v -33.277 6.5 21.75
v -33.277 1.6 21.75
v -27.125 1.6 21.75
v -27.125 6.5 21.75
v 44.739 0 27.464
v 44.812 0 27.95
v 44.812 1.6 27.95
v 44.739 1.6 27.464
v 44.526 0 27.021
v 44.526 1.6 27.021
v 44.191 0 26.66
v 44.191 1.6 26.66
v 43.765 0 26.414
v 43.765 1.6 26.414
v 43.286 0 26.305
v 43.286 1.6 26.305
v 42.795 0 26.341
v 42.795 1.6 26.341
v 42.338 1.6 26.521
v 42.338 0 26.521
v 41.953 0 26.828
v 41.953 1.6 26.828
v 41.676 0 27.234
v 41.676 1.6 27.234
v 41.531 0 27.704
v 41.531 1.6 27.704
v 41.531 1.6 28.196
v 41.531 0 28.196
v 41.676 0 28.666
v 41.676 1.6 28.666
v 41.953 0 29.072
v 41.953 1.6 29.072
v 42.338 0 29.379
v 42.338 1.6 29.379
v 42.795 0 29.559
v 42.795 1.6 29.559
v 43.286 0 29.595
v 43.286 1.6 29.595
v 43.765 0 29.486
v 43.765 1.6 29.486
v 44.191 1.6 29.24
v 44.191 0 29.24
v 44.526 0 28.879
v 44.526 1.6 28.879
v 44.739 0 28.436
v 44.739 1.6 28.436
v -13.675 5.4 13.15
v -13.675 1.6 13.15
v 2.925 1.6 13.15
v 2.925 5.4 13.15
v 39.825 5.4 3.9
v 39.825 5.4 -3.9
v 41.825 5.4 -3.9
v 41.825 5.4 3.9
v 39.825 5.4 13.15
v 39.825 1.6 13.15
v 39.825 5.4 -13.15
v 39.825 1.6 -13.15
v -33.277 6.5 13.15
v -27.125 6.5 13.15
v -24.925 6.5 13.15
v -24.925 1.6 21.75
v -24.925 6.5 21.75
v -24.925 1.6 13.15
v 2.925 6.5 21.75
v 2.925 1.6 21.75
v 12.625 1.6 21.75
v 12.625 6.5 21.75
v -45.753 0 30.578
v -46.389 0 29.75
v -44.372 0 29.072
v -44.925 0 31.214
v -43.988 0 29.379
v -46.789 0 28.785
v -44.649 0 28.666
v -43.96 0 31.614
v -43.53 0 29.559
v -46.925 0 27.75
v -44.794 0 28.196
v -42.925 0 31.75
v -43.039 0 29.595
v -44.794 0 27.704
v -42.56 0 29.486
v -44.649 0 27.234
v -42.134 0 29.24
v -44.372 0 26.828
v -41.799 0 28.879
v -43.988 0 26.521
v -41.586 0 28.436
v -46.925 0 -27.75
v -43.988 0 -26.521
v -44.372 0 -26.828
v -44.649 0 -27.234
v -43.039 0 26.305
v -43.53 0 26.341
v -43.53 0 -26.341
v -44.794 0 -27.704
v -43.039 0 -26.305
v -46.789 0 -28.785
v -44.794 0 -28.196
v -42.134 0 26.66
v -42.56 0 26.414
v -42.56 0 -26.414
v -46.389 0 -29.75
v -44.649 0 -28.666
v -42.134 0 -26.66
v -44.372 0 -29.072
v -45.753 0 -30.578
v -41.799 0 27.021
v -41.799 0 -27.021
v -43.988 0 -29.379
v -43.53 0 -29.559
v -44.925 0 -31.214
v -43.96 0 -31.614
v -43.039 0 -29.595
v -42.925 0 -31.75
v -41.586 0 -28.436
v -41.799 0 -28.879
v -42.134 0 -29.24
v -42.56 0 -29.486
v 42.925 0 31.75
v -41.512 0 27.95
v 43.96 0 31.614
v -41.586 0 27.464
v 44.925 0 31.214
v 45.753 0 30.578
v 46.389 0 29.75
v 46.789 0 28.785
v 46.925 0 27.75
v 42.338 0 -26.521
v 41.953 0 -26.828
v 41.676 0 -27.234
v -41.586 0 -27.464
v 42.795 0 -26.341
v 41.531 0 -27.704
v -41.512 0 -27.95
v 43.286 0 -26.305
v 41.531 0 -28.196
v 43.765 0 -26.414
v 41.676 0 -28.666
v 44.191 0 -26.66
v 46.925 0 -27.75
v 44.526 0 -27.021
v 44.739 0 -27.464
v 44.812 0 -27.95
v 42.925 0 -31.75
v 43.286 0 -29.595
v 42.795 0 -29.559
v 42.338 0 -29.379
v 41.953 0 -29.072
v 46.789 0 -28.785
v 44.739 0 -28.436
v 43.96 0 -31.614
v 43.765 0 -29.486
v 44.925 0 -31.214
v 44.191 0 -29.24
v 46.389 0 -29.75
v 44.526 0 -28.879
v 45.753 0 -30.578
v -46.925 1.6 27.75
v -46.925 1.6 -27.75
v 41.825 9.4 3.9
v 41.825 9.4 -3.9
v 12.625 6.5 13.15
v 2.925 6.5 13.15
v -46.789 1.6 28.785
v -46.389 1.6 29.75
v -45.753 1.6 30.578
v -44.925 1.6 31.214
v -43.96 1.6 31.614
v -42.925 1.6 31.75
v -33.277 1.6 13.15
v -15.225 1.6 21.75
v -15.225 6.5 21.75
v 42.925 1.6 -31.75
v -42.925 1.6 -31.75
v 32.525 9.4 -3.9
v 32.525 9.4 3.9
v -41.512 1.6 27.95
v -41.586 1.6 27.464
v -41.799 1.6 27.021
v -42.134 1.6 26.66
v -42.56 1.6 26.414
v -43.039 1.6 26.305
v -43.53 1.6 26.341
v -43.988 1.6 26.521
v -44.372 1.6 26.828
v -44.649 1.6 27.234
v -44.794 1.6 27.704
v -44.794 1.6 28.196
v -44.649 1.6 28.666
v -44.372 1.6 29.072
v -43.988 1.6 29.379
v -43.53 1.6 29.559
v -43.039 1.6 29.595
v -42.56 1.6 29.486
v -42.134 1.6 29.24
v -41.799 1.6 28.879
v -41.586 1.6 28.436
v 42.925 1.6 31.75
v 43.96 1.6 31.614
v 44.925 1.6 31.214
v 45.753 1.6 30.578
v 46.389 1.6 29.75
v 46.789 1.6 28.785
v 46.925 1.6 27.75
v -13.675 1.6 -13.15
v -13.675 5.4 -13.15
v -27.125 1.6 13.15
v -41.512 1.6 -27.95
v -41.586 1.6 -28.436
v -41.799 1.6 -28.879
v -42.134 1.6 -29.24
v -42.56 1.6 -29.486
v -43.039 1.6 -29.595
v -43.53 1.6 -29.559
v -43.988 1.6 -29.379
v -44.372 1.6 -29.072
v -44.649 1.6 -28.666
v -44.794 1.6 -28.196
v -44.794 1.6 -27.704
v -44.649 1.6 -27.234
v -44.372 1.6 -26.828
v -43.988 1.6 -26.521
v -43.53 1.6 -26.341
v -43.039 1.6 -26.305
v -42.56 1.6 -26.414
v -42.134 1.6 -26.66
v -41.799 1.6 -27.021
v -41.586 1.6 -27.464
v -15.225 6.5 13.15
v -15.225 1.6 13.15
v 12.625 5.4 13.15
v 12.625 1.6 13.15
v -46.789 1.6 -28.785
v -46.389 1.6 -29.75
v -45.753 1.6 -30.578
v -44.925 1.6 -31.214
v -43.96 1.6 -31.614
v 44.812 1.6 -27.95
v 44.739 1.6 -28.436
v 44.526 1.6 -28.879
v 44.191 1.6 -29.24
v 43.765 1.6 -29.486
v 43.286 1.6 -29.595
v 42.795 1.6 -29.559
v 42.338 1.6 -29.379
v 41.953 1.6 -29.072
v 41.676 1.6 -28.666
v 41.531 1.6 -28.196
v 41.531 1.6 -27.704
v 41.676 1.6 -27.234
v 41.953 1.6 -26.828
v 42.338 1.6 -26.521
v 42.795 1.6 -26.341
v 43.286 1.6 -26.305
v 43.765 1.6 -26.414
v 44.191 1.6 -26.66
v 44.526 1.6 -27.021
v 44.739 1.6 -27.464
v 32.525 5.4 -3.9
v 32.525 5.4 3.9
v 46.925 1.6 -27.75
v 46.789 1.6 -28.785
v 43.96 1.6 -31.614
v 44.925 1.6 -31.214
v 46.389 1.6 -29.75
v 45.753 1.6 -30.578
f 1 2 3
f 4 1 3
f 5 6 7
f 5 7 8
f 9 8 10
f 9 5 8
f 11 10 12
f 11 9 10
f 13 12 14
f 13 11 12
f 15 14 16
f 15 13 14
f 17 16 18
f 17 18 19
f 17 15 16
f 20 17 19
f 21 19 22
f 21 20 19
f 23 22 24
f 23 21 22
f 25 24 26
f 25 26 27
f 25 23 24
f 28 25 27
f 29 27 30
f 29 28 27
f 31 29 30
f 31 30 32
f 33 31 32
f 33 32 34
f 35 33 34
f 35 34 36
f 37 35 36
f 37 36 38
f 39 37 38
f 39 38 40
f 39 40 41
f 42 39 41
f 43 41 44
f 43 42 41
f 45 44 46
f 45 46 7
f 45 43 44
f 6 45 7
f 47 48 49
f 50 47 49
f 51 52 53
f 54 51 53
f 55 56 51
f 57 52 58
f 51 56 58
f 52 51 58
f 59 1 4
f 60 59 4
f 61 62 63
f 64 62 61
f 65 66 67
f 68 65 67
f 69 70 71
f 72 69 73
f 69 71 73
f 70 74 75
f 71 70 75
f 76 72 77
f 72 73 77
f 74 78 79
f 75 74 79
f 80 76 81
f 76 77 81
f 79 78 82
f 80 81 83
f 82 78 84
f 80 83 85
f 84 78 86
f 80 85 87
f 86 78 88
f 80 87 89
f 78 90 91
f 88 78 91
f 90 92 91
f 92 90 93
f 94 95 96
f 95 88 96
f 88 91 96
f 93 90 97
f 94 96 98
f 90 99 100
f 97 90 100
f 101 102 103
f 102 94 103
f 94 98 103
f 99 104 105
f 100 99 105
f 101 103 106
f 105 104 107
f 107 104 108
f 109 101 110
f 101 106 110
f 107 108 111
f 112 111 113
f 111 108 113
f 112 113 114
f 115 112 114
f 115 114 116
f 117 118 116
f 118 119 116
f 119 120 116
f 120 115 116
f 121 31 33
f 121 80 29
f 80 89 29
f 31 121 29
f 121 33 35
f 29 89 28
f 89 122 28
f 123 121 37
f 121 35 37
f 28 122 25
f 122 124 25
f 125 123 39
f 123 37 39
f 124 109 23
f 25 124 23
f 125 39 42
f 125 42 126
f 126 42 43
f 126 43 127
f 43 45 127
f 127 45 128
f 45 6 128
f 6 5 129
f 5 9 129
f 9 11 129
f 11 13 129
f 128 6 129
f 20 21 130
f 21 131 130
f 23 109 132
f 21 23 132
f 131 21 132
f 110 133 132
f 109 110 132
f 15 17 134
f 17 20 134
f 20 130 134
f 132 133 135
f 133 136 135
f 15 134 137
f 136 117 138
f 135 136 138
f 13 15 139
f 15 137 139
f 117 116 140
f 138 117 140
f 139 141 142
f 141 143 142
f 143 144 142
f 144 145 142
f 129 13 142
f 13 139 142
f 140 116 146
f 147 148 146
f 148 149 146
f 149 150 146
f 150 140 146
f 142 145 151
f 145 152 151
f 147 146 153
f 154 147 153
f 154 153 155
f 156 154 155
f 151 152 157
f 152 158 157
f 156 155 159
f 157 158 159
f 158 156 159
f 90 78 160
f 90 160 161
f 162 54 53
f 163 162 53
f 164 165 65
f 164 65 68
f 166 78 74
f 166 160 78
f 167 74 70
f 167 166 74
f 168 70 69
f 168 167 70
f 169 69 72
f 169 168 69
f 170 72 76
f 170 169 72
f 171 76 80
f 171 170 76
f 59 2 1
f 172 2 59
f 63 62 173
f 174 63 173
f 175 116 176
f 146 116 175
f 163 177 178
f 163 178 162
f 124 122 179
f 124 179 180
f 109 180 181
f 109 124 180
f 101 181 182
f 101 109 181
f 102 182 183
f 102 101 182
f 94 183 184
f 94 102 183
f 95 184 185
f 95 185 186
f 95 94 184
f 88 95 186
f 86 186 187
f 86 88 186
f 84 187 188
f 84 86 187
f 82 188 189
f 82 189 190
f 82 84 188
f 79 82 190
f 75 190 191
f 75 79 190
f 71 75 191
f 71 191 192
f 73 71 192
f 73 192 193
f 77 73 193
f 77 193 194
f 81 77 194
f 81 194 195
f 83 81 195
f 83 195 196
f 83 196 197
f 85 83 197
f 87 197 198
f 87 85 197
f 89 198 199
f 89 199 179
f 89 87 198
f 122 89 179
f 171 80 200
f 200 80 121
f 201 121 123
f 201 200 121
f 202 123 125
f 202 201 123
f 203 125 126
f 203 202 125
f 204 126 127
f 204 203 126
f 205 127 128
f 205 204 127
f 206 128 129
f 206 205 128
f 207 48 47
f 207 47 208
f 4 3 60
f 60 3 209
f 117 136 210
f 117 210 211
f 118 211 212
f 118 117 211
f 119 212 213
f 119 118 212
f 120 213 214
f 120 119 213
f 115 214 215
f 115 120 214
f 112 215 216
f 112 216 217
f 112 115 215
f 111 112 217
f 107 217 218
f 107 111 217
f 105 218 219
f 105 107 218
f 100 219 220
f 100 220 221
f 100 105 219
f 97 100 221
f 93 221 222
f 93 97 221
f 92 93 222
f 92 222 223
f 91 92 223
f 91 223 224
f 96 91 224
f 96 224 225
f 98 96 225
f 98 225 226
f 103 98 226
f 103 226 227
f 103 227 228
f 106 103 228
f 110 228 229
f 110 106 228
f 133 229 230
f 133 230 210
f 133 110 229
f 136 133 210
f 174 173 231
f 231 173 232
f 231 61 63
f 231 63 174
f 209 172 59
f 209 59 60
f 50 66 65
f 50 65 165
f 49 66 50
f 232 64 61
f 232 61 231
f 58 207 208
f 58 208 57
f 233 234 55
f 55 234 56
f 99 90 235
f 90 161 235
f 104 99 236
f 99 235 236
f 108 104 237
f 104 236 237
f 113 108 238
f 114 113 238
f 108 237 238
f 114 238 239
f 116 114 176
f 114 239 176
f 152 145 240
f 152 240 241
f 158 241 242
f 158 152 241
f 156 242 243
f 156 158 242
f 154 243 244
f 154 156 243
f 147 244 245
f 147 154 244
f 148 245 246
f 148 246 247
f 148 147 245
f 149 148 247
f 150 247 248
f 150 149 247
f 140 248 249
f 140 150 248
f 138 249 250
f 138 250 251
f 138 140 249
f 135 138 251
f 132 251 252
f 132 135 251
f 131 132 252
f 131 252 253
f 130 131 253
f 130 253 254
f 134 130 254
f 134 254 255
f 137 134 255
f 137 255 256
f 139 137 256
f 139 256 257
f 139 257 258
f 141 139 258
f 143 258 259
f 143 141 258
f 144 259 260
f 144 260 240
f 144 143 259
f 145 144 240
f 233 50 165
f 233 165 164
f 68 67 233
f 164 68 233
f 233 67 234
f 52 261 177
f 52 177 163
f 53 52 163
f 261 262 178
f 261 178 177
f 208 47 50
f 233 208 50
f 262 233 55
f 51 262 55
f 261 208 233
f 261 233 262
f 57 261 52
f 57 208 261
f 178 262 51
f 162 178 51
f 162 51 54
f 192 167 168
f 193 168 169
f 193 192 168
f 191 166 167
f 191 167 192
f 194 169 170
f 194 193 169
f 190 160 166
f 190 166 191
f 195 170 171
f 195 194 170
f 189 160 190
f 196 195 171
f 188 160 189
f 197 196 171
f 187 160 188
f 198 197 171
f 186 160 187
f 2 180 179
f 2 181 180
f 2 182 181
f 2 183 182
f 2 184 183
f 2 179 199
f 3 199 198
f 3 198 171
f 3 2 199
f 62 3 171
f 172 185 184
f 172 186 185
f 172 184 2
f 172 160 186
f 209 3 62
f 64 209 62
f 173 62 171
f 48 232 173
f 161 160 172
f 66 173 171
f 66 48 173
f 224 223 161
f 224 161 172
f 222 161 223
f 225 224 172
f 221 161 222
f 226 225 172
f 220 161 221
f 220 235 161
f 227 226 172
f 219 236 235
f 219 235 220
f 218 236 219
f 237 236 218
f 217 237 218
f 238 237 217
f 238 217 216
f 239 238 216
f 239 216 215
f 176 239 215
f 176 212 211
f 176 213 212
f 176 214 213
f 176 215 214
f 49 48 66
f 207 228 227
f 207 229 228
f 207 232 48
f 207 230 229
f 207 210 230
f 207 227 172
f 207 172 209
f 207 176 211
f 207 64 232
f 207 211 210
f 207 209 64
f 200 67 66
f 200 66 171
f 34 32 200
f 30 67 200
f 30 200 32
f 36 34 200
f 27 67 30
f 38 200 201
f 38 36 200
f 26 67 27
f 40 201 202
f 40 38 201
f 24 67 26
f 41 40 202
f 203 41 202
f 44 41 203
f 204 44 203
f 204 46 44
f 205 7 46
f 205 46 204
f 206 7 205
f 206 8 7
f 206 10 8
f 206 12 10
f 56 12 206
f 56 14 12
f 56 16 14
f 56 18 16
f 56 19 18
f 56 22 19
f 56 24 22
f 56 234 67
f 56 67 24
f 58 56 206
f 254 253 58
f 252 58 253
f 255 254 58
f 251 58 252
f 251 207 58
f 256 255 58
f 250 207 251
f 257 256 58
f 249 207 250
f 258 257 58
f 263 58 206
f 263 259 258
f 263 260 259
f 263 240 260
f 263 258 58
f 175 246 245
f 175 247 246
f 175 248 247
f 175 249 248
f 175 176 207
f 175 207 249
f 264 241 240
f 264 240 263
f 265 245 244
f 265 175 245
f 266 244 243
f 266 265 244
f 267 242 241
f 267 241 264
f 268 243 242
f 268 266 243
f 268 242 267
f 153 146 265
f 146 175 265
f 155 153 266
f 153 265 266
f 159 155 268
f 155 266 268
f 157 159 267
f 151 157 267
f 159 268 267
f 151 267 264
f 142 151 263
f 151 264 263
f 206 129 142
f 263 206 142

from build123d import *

# Parameters (mm, degrees)
SKETCH1_W           = 93.85
SKETCH1_H           = 63.5
SKETCH1_R           = 1.65
BOSS_EXTRUDE1_DEPTH = 1.6
FILLET1_R           = 4
SKETCH2_W           = 53.5
SKETCH2_H           = 26.3
BOSS_EXTRUDE2_DEPTH = 3.8
SKETCH3_W           = 9.3
SKETCH3_H           = 7.8
BOSS_EXTRUDE3_DEPTH = 4
SKETCH4_W           = 9.7
SKETCH4_H           = 8.6
SKETCH4_W_2         = 6.151959396
BOSS_EXTRUDE4_DEPTH = 4.9


with BuildPart() as part:
    # Sketch1 → Boss-Extrude1 (new body)
    with BuildSketch(Plane(origin=(0, 0, 0), x_dir=(1, 0, 0), z_dir=(0, 1, 0))):
        Rectangle(SKETCH1_W, SKETCH1_H)
        with Locations((-43.1625, 27.95)):
            Circle(SKETCH1_R, mode=Mode.SUBTRACT)
        with Locations((43.1625, 27.95)):
            Circle(SKETCH1_R, mode=Mode.SUBTRACT)
        with Locations((43.1625, -27.95)):
            Circle(SKETCH1_R, mode=Mode.SUBTRACT)
        with Locations((-43.1625, -27.95)):
            Circle(SKETCH1_R, mode=Mode.SUBTRACT)
    extrude(amount=BOSS_EXTRUDE1_DEPTH)

    # Fillet1
    fillet1_edges = [part.edges().sort_by_distance(p)[0] for p in [
        (46.925, 0.8, 31.75),
        (-46.925, 0.8, 31.75),
        (-46.925, 0.8, -31.75),
        (46.925, 0.8, -31.75),
    ]]
    fillet(fillet1_edges, radius=FILLET1_R)

    # Sketch2 → Boss-Extrude2 (add)
    with BuildSketch(Plane(origin=(0, 1.6, 0), x_dir=(1, 0, 0), z_dir=(0, 1, 0))):
        with Locations((13.075, 0)):
            Rectangle(SKETCH2_W, SKETCH2_H)
    extrude(amount=BOSS_EXTRUDE2_DEPTH)

    # Sketch3 → Boss-Extrude3 (add)
    with BuildSketch(Plane(origin=(0, 5.4, 0), x_dir=(1, 0, 0), z_dir=(0, 1, 0))):
        with Locations((37.175, 0)):
            Rectangle(SKETCH3_W, SKETCH3_H)
    extrude(amount=BOSS_EXTRUDE3_DEPTH)

    # Sketch4 → Boss-Extrude4 (add)
    with BuildSketch(Plane(origin=(0, 1.6, 0), x_dir=(1, 0, 0), z_dir=(0, 1, 0))):
        with Locations((7.775, -17.45)):
            Rectangle(SKETCH4_W, SKETCH4_H)
        with Locations((-20.075, -17.45)):
            Rectangle(SKETCH4_W, SKETCH4_H)
        with Locations((-30.200979698, -17.45)):
            Rectangle(SKETCH4_W_2, SKETCH4_H)
    extrude(amount=BOSS_EXTRUDE4_DEPTH)


solid = part.part
